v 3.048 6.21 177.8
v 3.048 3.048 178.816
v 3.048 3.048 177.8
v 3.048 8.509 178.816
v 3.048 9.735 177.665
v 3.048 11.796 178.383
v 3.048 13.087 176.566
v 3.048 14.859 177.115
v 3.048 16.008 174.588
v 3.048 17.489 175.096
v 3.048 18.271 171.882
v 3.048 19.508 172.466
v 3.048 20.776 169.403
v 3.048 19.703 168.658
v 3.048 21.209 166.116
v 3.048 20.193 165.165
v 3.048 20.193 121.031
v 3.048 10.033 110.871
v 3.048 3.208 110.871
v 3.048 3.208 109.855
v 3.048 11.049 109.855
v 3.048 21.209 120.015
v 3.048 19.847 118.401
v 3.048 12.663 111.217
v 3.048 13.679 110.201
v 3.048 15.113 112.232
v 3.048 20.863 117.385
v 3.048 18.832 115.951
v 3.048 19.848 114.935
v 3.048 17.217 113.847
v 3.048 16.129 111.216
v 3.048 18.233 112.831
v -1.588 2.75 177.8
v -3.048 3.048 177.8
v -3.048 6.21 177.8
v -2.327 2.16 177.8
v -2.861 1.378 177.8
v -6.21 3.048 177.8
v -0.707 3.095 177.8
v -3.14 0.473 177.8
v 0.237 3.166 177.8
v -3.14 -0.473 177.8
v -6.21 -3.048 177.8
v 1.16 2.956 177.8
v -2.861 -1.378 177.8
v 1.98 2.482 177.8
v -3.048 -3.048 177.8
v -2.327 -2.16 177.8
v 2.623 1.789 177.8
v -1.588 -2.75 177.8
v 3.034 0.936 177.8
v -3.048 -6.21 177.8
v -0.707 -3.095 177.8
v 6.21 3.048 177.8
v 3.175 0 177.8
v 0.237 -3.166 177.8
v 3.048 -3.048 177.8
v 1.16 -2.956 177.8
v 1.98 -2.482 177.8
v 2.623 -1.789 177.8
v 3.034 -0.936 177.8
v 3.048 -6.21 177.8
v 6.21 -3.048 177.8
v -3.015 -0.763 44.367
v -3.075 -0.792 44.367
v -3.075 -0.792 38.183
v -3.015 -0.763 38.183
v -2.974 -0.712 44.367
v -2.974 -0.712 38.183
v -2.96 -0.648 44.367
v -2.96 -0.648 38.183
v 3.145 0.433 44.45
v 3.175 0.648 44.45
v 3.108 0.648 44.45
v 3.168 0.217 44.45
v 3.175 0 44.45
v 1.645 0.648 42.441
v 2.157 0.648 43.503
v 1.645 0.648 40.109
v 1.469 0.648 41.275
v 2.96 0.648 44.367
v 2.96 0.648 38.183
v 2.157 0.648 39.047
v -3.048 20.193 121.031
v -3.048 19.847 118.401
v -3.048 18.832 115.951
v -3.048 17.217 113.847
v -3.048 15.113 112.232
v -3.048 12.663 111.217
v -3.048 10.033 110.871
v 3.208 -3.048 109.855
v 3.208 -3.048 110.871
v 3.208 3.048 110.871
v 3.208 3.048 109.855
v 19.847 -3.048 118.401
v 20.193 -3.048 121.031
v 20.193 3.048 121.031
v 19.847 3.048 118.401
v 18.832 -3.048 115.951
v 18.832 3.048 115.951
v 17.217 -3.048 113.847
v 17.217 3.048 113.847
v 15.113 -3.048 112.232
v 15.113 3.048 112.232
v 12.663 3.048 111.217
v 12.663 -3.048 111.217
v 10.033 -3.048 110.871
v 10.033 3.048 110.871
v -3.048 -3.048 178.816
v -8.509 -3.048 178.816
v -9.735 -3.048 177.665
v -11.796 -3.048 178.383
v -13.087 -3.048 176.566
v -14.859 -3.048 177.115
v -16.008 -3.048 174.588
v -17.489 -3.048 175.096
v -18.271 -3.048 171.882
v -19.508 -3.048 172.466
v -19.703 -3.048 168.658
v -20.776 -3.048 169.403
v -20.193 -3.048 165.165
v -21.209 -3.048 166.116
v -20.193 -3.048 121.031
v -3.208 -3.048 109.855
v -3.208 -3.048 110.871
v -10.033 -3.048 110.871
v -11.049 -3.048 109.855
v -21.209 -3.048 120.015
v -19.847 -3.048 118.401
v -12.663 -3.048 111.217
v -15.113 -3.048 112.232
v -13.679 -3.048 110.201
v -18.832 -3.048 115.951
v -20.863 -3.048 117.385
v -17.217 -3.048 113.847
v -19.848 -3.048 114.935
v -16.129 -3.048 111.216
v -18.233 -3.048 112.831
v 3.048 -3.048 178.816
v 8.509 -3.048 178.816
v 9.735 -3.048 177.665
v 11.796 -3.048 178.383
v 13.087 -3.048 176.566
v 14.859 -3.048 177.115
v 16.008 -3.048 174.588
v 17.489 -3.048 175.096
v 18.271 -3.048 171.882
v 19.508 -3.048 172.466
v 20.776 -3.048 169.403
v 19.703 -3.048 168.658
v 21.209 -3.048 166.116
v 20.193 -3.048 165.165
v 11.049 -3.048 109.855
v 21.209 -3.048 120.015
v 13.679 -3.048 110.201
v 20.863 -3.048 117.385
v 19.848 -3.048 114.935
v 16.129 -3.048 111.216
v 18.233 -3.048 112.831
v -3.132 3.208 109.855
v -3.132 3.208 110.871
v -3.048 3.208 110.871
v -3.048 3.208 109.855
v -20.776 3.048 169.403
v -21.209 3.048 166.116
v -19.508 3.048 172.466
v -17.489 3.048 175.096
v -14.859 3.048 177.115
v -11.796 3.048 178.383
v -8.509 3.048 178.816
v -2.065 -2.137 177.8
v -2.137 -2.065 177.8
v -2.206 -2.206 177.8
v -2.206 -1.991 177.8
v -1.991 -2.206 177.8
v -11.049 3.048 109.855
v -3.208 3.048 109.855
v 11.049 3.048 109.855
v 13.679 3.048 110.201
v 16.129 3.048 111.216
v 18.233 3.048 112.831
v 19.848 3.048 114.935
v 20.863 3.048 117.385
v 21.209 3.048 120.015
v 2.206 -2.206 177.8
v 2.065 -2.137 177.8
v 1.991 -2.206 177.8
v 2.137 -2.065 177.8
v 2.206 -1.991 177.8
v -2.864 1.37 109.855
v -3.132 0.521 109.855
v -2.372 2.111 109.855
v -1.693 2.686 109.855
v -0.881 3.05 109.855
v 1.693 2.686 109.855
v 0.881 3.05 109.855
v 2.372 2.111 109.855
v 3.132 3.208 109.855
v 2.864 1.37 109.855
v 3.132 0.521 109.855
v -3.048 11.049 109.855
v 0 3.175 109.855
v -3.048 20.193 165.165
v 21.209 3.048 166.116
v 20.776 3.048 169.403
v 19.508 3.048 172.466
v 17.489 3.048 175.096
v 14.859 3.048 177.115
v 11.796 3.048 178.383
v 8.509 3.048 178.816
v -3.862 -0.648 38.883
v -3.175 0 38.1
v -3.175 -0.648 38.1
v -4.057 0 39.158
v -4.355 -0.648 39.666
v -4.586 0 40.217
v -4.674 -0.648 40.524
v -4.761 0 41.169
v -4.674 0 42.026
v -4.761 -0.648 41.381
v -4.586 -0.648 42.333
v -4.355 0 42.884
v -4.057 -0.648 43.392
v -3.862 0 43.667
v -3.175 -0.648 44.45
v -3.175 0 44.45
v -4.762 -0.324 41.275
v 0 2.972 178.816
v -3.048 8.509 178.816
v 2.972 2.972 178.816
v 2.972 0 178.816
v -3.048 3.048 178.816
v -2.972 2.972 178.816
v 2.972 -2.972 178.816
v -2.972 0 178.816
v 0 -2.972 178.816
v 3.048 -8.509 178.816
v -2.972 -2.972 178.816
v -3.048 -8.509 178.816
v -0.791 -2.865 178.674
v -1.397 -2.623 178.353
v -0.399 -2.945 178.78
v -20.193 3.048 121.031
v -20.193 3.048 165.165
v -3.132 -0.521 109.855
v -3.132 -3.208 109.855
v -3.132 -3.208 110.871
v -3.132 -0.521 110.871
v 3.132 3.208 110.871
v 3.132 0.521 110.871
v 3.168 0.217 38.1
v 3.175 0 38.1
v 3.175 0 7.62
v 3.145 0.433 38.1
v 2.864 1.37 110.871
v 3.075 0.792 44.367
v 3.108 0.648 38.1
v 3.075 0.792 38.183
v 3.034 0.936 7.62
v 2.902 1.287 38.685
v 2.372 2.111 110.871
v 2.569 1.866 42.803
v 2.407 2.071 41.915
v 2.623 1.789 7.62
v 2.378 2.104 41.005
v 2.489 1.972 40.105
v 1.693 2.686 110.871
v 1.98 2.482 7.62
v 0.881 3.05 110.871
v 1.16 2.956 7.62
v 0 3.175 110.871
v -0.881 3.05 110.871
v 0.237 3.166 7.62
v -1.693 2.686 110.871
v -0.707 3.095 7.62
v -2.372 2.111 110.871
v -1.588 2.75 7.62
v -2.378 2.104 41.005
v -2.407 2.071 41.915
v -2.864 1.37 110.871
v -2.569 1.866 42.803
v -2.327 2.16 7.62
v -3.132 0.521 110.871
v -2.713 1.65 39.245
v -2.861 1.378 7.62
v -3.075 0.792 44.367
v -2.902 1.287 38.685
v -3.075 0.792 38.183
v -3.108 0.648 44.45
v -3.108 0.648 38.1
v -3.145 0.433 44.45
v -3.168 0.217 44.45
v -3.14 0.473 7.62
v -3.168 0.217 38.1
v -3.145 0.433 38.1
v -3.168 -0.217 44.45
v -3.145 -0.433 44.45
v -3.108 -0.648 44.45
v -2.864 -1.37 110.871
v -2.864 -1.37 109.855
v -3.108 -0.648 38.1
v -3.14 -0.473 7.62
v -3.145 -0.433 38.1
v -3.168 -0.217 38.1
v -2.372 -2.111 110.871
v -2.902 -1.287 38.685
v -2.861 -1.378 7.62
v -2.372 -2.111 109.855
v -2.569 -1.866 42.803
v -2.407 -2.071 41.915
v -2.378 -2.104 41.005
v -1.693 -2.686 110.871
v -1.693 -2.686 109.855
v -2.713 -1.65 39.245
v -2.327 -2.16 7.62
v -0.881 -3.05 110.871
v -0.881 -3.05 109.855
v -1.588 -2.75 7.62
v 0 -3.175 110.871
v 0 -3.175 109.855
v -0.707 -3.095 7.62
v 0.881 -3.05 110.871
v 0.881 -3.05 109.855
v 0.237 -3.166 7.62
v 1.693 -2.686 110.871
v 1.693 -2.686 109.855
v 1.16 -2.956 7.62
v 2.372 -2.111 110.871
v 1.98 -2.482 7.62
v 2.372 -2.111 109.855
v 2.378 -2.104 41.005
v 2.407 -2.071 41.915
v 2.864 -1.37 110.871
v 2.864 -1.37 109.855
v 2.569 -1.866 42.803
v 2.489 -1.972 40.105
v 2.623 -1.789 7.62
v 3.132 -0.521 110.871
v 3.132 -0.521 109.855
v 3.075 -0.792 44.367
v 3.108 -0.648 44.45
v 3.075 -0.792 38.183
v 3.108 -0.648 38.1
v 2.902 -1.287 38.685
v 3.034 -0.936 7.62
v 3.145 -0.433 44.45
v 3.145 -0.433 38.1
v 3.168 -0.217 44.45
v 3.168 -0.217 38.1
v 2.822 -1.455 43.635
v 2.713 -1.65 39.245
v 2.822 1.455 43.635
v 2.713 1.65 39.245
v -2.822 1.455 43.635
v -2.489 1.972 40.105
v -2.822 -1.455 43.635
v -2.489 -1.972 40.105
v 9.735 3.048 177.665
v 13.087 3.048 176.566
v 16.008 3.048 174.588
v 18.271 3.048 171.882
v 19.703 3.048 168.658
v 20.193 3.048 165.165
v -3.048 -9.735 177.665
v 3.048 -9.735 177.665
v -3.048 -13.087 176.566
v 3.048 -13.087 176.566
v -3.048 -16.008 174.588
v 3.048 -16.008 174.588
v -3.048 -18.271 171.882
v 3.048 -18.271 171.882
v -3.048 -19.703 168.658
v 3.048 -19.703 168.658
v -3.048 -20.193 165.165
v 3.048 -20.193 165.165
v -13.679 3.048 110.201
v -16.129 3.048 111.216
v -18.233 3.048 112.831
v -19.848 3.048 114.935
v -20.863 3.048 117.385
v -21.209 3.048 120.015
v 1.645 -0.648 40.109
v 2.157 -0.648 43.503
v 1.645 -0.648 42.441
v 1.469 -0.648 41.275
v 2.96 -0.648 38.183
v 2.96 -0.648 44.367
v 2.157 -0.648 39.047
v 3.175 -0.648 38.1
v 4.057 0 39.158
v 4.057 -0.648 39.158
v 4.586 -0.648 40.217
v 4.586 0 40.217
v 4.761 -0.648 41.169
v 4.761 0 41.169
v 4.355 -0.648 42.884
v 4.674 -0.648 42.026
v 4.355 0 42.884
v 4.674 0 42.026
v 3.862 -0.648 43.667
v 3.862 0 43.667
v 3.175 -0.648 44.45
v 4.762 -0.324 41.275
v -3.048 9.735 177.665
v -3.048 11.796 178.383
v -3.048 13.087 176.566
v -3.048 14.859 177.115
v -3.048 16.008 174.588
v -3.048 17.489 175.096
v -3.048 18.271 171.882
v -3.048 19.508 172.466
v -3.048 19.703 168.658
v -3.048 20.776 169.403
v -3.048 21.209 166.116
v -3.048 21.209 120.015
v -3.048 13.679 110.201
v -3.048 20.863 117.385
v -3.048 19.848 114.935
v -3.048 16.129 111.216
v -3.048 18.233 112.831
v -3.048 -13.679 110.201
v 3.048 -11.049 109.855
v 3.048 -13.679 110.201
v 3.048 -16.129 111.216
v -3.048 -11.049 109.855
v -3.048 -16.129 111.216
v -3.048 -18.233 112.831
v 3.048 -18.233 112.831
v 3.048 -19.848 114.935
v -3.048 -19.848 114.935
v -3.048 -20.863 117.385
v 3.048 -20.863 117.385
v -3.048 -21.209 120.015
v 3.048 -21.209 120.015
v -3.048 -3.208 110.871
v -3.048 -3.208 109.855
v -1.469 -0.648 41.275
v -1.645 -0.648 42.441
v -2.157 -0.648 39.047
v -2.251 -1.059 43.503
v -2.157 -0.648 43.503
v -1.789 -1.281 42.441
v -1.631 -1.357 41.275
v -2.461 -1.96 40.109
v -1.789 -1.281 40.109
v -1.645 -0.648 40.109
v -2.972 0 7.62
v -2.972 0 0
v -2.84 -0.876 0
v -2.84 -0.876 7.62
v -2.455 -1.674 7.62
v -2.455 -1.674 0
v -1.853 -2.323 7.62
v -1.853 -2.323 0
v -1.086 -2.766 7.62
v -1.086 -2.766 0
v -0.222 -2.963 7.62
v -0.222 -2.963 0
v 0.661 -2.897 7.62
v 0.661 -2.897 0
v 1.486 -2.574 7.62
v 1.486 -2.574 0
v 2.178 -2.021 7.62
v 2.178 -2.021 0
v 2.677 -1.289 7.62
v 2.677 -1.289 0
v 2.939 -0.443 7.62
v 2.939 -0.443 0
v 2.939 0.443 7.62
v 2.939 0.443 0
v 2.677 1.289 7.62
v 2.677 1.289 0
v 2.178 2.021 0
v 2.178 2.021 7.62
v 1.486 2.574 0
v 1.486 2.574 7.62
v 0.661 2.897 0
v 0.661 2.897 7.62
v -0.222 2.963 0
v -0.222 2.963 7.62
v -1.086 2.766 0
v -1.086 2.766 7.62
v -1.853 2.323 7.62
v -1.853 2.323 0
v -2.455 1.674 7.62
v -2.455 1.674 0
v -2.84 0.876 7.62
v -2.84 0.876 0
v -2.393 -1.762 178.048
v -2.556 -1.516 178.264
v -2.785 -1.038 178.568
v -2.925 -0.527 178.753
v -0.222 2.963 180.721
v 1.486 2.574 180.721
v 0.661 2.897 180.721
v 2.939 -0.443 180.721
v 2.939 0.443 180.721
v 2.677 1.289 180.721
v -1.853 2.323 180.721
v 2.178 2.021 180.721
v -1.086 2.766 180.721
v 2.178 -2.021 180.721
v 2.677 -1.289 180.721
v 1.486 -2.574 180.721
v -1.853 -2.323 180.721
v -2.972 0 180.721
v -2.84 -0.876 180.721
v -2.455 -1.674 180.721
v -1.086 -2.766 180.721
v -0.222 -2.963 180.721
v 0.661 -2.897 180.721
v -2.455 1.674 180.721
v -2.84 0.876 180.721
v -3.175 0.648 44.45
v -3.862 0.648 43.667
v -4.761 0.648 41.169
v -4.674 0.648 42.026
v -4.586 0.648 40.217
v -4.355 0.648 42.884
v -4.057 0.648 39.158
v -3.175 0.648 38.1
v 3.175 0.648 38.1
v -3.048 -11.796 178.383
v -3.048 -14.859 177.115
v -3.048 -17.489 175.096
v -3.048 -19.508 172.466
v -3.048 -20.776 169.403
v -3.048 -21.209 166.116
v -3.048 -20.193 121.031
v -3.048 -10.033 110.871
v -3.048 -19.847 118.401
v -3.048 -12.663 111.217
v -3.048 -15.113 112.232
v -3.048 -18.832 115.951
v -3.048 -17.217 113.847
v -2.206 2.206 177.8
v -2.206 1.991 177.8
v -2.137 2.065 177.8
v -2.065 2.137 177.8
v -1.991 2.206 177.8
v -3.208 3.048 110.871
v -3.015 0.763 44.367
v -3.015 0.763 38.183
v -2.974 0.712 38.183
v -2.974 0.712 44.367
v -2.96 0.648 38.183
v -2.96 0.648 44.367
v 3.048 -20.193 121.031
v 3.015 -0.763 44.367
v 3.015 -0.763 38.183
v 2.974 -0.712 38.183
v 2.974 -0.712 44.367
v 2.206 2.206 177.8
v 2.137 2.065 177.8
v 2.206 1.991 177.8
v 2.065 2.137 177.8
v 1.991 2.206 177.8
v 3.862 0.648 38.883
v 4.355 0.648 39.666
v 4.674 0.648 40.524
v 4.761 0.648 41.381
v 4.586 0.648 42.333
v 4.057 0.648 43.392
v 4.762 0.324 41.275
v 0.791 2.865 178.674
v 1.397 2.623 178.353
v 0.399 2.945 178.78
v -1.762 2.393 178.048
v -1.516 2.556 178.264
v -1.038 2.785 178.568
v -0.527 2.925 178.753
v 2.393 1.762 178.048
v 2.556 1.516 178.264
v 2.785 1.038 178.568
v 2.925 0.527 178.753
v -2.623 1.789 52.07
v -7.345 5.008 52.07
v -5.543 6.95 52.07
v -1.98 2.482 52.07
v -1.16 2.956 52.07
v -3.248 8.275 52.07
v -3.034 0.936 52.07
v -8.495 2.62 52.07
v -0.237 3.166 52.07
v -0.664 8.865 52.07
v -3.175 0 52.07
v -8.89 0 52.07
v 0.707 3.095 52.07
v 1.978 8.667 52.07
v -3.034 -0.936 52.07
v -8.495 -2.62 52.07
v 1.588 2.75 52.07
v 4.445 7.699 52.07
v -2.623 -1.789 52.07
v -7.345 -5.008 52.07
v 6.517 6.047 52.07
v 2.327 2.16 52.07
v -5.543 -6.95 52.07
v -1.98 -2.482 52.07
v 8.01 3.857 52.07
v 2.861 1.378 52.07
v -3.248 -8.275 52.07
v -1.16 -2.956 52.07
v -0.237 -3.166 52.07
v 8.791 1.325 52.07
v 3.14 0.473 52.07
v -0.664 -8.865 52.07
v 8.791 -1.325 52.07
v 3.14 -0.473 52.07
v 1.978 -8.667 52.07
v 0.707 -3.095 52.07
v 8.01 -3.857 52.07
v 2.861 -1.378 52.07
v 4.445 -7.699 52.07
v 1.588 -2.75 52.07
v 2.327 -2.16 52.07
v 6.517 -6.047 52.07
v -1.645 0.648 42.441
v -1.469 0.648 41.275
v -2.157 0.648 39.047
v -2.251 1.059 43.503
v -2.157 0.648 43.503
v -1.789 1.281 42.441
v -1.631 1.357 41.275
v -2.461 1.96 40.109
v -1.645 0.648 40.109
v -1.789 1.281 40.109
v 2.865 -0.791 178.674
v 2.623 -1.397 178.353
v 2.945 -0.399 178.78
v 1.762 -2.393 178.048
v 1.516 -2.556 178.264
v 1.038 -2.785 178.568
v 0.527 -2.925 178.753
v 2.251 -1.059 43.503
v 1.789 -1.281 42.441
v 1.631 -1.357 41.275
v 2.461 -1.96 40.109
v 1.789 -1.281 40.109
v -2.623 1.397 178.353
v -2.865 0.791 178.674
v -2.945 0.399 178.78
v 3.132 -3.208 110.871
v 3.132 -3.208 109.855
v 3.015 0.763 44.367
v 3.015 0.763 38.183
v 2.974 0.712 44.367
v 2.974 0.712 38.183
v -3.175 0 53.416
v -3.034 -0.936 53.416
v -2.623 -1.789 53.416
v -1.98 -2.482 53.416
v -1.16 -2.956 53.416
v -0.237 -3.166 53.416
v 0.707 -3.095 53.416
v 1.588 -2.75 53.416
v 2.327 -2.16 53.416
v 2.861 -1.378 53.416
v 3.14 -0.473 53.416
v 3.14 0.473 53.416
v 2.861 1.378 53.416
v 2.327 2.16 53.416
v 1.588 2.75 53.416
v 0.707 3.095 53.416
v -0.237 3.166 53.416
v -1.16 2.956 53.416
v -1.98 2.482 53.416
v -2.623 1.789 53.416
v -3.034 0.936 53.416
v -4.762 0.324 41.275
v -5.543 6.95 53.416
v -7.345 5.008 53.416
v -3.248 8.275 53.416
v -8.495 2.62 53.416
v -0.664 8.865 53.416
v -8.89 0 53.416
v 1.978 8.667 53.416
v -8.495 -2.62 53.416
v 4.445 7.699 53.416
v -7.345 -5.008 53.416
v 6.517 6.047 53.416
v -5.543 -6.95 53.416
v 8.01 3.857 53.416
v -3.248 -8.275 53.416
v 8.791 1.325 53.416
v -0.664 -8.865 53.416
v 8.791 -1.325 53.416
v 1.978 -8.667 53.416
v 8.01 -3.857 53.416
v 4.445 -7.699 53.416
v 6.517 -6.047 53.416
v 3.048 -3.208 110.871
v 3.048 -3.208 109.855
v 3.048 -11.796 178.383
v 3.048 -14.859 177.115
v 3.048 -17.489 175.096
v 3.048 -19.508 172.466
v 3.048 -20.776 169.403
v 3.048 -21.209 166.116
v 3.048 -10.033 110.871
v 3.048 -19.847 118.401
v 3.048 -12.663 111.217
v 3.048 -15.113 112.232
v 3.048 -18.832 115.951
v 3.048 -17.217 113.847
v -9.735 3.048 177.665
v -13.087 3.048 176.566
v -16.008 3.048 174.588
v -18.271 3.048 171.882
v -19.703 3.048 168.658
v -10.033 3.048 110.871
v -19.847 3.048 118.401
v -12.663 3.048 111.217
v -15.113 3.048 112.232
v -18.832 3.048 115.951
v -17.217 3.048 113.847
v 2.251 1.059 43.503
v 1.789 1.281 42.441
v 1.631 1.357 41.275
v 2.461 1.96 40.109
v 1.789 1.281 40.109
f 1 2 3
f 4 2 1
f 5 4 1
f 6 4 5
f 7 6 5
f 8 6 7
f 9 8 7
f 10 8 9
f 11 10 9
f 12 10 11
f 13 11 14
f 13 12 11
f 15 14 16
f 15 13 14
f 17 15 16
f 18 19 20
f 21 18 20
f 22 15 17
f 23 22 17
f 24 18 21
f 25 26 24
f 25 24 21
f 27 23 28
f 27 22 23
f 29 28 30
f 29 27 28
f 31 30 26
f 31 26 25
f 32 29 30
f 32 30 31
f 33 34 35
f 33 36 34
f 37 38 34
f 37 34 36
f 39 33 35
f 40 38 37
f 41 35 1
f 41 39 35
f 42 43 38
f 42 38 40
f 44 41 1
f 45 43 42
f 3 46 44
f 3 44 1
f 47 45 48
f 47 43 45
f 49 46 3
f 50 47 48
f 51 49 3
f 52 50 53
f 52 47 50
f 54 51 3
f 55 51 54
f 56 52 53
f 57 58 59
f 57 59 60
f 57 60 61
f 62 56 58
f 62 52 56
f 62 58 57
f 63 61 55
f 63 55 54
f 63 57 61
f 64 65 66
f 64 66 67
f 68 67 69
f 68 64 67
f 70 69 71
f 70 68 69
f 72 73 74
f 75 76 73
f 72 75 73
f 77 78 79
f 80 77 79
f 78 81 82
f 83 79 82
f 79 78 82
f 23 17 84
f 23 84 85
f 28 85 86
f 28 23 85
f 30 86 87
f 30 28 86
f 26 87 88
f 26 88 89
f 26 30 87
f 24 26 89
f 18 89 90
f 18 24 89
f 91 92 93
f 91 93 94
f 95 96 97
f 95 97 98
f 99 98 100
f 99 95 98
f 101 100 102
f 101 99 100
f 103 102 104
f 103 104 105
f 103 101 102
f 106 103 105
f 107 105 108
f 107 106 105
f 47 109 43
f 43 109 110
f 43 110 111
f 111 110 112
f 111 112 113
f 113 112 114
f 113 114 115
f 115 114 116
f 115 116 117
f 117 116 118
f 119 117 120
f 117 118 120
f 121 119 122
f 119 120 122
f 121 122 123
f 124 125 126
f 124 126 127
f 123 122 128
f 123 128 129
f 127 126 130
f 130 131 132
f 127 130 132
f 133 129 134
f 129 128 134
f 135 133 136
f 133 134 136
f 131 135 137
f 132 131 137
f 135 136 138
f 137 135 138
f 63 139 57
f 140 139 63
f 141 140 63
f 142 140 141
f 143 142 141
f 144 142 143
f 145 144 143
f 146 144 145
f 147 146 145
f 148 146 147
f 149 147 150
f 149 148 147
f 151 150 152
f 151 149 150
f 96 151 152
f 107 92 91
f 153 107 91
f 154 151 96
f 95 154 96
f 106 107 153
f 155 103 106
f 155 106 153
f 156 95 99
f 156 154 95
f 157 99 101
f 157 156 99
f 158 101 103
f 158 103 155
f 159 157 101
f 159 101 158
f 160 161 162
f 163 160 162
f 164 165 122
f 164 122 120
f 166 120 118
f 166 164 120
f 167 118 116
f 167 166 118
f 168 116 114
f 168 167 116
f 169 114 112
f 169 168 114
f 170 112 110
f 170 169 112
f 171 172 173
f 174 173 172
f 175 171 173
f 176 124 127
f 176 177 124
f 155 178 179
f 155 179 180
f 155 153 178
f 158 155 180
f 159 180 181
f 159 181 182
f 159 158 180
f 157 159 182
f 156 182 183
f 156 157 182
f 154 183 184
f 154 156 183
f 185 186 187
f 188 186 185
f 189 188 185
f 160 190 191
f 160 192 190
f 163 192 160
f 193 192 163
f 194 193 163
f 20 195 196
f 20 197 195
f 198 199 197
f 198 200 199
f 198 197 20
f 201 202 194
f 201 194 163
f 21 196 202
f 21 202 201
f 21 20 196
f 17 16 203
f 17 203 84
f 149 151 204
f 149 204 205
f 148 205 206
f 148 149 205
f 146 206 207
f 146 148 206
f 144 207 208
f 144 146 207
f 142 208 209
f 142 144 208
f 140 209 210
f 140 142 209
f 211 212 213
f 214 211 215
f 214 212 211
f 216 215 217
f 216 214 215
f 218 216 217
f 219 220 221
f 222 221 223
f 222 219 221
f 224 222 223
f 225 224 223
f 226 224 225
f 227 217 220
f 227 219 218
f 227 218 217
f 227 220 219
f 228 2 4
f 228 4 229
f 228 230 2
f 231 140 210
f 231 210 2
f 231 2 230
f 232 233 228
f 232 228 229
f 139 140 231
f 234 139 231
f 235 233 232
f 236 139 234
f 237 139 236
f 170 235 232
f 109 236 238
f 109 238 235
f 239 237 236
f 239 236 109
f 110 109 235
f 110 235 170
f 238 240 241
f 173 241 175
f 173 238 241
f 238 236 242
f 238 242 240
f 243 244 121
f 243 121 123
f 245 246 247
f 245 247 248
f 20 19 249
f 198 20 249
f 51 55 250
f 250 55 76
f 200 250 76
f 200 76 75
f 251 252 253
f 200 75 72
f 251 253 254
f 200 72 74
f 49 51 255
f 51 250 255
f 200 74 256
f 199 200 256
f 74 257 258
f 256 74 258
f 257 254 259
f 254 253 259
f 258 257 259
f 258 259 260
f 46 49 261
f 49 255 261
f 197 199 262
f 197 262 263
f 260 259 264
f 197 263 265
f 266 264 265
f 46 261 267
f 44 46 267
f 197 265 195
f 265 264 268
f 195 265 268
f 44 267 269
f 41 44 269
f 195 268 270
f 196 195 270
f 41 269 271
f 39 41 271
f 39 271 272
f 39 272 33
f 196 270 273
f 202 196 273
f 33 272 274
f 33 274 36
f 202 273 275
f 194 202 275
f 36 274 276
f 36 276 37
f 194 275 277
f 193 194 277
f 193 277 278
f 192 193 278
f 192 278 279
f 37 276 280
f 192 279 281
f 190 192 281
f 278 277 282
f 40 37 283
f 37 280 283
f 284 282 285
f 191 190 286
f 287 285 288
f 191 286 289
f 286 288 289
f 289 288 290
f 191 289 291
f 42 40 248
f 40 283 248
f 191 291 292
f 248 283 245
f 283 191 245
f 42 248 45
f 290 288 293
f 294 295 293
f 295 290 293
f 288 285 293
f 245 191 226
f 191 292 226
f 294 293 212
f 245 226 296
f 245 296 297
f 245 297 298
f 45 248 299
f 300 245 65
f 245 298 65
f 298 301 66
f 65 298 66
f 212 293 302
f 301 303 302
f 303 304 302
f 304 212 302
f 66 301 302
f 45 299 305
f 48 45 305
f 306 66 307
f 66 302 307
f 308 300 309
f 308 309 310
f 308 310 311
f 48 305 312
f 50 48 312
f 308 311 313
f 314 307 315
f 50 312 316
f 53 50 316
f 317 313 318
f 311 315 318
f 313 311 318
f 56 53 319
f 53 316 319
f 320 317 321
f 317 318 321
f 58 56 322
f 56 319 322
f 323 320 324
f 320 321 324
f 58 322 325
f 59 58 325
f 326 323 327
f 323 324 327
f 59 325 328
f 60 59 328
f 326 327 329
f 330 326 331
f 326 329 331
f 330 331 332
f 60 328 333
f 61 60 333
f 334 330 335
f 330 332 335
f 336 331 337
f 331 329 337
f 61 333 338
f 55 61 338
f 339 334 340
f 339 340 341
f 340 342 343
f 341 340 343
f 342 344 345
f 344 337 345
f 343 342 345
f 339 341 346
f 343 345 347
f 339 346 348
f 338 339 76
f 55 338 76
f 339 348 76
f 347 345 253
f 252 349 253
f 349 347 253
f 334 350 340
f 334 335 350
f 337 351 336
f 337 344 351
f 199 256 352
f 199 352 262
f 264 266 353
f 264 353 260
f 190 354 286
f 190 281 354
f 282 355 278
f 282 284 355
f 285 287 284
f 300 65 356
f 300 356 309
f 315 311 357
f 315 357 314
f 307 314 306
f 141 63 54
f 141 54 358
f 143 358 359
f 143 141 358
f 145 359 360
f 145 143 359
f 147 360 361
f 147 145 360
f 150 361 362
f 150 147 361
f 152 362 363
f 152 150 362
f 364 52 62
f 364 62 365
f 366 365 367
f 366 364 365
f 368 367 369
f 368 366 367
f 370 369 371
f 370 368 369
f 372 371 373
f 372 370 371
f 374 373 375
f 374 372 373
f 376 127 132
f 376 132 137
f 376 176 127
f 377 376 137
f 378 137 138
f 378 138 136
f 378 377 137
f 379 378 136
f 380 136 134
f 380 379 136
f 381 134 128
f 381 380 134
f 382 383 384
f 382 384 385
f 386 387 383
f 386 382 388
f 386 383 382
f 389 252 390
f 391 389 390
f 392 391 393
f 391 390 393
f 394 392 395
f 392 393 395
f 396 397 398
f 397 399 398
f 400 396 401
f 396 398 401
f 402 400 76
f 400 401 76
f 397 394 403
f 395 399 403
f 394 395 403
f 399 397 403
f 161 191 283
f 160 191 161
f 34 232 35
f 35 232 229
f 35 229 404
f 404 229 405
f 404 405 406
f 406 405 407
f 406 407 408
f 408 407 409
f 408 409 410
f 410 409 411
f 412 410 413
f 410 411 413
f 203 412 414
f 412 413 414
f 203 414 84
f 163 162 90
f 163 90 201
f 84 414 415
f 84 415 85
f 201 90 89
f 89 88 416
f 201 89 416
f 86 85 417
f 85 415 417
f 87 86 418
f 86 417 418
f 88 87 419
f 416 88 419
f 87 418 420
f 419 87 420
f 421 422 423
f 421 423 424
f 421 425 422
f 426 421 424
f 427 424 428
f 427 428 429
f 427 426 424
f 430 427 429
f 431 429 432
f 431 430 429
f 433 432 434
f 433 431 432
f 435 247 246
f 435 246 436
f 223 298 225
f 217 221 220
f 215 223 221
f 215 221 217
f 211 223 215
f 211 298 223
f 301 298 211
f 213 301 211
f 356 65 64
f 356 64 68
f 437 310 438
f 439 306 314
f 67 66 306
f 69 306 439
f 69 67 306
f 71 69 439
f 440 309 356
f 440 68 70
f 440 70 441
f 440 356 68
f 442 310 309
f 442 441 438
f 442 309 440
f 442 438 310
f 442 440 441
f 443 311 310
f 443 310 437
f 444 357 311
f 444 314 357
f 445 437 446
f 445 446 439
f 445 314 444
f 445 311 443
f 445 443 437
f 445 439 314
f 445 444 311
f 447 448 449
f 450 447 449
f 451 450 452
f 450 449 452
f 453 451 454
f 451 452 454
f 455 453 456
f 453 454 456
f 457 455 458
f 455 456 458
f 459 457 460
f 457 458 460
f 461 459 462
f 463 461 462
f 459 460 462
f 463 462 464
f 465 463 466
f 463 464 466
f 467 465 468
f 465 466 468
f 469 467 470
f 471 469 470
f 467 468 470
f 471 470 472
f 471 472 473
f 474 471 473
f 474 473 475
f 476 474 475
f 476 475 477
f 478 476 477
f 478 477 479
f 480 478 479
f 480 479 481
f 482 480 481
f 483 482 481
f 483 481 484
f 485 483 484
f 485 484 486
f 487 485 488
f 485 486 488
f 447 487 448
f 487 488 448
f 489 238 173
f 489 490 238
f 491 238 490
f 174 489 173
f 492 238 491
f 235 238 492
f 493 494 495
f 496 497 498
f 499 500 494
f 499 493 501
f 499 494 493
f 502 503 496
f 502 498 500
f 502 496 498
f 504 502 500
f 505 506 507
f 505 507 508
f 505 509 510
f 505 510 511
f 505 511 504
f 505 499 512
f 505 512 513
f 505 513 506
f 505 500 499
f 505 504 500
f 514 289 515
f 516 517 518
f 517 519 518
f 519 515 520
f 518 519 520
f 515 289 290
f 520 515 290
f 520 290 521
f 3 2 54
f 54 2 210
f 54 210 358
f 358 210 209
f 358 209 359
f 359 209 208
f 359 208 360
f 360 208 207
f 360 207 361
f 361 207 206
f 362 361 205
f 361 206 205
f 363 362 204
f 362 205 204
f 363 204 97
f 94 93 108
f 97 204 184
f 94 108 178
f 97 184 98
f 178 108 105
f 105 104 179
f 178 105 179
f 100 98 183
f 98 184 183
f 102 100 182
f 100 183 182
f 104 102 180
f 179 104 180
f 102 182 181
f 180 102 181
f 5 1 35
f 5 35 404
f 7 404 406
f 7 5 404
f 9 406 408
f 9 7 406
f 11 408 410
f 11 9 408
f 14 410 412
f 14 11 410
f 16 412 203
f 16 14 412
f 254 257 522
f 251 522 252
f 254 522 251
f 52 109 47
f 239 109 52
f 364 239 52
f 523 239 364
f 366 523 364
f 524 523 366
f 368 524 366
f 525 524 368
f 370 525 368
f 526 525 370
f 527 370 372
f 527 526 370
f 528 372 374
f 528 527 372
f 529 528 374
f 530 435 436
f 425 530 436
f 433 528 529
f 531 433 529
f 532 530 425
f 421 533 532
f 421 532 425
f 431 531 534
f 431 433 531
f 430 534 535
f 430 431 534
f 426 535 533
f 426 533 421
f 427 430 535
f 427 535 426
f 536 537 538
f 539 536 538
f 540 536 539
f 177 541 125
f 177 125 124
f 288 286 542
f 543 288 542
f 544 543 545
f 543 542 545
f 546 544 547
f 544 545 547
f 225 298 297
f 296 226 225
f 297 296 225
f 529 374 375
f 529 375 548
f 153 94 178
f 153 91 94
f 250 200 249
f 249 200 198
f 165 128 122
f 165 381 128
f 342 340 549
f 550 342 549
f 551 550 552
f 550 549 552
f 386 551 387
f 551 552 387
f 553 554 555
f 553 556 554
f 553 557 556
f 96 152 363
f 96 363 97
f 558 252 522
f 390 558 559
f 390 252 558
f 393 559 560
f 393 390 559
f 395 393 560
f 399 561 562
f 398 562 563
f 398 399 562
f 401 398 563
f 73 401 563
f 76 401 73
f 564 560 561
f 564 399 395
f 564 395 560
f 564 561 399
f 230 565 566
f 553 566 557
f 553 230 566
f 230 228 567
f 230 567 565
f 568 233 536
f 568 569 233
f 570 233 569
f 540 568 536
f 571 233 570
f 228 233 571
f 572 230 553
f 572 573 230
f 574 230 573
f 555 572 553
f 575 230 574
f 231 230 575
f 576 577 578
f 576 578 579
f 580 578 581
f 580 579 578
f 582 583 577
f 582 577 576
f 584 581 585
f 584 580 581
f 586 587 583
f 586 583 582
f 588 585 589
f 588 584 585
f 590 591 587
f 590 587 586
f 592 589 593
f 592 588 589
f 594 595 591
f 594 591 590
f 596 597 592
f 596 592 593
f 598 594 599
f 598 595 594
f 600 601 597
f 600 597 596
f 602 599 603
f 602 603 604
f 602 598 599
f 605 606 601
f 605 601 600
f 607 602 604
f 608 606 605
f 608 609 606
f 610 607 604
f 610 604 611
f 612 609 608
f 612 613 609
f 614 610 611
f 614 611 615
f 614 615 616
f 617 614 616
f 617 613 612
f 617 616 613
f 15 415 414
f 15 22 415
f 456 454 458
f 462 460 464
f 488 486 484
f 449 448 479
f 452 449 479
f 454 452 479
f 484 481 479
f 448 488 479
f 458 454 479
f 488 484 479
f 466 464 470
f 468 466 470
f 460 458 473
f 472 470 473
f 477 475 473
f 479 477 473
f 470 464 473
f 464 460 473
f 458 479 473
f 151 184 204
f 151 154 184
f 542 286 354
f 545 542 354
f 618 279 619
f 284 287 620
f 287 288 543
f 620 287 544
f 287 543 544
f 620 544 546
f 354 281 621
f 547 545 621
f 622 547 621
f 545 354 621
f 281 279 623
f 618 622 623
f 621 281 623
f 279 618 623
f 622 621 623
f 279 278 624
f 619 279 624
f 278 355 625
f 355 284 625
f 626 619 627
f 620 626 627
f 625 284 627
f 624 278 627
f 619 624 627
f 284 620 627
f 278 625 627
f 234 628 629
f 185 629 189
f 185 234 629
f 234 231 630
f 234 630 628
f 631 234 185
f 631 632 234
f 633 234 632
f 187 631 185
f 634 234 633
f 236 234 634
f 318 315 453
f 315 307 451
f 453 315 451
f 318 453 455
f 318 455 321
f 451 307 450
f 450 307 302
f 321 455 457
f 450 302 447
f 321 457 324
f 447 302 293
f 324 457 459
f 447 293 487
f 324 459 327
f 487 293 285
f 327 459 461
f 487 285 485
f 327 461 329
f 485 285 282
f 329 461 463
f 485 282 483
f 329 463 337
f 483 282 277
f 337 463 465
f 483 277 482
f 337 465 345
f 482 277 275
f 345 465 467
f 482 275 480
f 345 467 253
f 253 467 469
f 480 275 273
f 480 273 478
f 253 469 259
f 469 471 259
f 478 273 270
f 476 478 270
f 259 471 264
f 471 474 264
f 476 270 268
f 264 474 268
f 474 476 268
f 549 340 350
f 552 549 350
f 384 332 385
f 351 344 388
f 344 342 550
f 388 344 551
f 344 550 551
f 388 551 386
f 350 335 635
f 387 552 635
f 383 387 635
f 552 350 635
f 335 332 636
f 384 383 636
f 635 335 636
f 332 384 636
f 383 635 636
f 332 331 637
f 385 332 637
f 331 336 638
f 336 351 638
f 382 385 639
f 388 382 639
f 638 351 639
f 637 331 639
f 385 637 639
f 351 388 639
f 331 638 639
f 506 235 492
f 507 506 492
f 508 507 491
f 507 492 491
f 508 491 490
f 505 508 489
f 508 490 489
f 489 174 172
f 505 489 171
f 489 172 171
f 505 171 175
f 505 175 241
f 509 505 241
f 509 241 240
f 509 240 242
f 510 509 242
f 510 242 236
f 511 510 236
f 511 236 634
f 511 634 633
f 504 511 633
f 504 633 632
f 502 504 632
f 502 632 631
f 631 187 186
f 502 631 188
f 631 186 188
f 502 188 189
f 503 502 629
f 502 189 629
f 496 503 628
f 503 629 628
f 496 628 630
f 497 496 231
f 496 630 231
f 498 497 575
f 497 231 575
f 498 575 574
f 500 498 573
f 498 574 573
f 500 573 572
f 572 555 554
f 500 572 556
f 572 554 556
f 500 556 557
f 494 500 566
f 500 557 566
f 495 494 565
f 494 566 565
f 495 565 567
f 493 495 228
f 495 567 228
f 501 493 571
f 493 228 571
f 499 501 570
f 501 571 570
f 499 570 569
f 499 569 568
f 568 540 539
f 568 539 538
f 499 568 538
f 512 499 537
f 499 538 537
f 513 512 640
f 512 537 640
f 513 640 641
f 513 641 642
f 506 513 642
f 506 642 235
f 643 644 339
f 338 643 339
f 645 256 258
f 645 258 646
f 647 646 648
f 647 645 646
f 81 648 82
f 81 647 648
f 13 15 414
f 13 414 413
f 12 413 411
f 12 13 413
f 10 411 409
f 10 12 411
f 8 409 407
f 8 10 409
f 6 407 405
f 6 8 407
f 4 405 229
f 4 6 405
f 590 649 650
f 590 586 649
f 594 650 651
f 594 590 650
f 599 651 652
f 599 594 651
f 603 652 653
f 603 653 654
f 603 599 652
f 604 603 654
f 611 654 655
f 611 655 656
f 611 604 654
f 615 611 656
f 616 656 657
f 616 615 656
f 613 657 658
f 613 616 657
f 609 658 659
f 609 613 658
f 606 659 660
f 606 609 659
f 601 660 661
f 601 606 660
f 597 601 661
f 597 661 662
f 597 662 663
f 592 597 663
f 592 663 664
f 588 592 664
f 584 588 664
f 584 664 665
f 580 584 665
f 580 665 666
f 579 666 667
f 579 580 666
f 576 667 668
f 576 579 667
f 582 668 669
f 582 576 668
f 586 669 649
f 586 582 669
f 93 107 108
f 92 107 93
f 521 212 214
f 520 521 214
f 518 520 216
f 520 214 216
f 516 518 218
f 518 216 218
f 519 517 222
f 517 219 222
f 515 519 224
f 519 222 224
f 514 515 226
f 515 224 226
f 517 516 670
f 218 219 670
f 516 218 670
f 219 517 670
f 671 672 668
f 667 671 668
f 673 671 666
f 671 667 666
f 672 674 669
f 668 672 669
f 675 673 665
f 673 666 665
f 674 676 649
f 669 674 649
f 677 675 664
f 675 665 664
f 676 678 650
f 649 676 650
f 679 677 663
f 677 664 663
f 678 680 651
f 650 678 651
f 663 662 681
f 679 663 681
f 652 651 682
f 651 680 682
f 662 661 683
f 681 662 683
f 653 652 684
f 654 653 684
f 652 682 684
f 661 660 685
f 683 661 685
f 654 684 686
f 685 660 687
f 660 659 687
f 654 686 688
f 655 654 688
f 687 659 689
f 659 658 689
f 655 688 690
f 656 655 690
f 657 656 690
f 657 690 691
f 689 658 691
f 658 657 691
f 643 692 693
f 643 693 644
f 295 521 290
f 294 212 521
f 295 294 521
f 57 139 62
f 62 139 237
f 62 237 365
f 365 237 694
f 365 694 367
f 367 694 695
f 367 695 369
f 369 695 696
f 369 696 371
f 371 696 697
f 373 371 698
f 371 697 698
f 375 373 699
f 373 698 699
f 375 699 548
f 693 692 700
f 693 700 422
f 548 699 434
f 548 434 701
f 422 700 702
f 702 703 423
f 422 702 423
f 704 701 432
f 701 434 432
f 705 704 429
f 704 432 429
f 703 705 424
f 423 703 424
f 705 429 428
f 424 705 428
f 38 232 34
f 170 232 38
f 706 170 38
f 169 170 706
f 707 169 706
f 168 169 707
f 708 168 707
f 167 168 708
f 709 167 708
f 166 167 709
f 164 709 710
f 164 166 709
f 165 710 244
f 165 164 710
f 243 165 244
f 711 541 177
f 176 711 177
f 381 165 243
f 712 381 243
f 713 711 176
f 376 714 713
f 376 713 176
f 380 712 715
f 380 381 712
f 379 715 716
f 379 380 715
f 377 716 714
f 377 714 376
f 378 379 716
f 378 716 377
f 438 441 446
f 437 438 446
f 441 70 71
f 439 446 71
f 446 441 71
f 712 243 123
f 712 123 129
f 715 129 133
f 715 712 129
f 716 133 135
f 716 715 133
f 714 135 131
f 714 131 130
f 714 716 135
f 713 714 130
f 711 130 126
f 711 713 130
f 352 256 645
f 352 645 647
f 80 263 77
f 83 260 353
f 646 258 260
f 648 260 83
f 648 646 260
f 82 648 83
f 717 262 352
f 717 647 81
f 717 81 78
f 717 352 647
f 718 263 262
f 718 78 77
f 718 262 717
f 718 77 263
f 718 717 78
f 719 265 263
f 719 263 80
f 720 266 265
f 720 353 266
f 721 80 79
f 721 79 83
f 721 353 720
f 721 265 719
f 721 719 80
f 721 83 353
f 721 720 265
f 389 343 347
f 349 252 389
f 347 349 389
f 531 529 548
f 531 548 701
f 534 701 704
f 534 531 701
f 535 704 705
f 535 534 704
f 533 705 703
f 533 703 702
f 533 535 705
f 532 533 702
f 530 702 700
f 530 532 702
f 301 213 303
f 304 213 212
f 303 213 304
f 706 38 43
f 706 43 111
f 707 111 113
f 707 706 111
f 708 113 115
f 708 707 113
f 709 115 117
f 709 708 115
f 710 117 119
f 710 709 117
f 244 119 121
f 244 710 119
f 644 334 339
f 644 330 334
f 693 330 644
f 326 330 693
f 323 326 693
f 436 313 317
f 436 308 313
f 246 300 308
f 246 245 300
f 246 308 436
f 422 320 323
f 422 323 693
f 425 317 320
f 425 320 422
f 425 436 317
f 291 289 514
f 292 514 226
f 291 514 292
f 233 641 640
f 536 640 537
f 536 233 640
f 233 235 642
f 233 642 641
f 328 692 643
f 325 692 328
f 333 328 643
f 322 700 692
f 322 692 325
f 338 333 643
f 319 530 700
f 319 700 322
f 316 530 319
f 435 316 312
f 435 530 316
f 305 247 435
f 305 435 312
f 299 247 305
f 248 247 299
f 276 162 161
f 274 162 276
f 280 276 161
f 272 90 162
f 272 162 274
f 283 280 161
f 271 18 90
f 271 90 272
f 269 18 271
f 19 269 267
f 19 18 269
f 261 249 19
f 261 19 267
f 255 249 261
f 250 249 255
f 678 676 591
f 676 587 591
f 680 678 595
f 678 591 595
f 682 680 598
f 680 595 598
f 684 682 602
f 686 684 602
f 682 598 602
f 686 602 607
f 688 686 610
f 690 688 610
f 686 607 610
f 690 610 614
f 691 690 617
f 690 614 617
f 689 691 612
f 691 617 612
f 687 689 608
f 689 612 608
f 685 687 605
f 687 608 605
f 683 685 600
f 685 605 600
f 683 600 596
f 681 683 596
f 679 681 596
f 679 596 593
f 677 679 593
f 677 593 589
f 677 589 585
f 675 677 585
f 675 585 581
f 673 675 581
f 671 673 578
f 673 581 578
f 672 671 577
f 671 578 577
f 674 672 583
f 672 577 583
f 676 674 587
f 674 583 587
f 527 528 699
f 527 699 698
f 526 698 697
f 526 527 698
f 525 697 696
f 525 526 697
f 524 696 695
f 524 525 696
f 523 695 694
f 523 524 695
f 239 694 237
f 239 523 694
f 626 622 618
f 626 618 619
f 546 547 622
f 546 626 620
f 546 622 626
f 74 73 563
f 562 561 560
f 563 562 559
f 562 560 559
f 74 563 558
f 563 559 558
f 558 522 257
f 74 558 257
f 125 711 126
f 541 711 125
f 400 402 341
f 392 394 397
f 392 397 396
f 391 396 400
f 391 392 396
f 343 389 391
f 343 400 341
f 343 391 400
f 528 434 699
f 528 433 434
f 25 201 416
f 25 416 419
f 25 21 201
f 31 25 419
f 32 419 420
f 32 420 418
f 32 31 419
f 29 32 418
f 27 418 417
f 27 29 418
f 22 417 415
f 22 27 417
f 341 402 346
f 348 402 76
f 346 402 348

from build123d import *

# Parameters (mm, degrees)
SKETCH1_R            = 3.175
BOSS_EXTRUDE1_DEPTH  = 177.8
SKETCH2_R            = 2.9718
BOSS_EXTRUDE2_DEPTH  = 7.874
BOSS_EXTRUDE3_DEPTH  = 0.6477
SKETCH2_7_OUTSIDE_W  = 47.16
SKETCH2_7_OUTSIDE_H  = 43.984
SKETCH2_7_OUTSIDE_R  = 2.9718
CUT_EXTRUDE2_DEPTH   = 7.62
SKETCH9_W            = 1.3462
SKETCH9_H            = 5.715
SKETCH31_R           = 2.9718
BOSS_EXTRUDE6_DEPTH  = 2.921
SKETCH32_W           = 6.263880776
SKETCH32_H           = 6.416852852
BOSS_EXTRUDE9_DEPTH  = 1.016
BOSS_EXTRUDE10_DEPTH = 3.048
CIRPATTERN1_COUNT    = 4
CUT_REVOLVE3_ANGLE   = 180
MIRROR3_COPY_1_ANGLE = 180


with BuildPart() as part:
    # Sketch1 → Boss-Extrude1 (new body)
    with BuildSketch(Plane.XY):
        Circle(SKETCH1_R)
    extrude(amount=BOSS_EXTRUDE1_DEPTH)

    # Sketch2 → Boss-Extrude2 (add)
    with BuildSketch(Plane.XY):
        Circle(SKETCH2_R)
    extrude(amount=BOSS_EXTRUDE2_DEPTH)

    # Sketch3 → Boss-Extrude3 (add, symmetric)
    with BuildSketch(Plane(origin=(0, 0, 0), x_dir=(1, 0, 0), z_dir=(0, 1, 0))):
        with BuildLine():
            Line((-3.175, -38.1), (3.175, -38.1))
            add(Edge.make_bspline(
                [(3.175, -38.1), (6.35, -41.275), (3.175, -44.45)],
                knots=[0, 0, 0, 1, 1, 1], degree=2))
            Line((3.175, -44.45), (-3.175, -44.45))
            add(Edge.make_bspline(
                [(-3.175, -38.1), (-6.35, -41.275), (-3.175, -44.45)],
                knots=[0, 0, 0, 1, 1, 1], degree=2))
        make_face()
    extrude(amount=BOSS_EXTRUDE3_DEPTH, both=True)

    # Sketch2<7> outside → Cut-Extrude2 (cut)
    with BuildSketch(Plane.XY):
        Rectangle(SKETCH2_7_OUTSIDE_W, SKETCH2_7_OUTSIDE_H)
        with Locations(Location((0, 0, 0), (0, 0, 180))):
            Circle(SKETCH2_7_OUTSIDE_R, mode=Mode.SUBTRACT)
    extrude(amount=CUT_EXTRUDE2_DEPTH, mode=Mode.SUBTRACT)

    # Sketch31 → Boss-Extrude6 (add)
    with BuildSketch(Plane.XY.offset(177.8)):
        with Locations(Location((0, 0, 0), (0, 0, 180))):
            Circle(SKETCH31_R)
    extrude(amount=BOSS_EXTRUDE6_DEPTH)

    # Sketch32 → Boss-Extrude9 (add)
    with BuildSketch(Plane.XY.offset(109.855)):
        Rectangle(SKETCH32_W, SKETCH32_H)
    extrude(amount=BOSS_EXTRUDE9_DEPTH)

    # Sketch30 → Boss-Extrude10 (add, symmetric)
    with BuildSketch(Plane(origin=(0, 0, 0), x_dir=(0, 0, -1), z_dir=(1, 0, 0))):
        with BuildLine():
            Line((-120.015, 21.209), (-166.116, 21.209))
            ThreePointArc((-166.116, 21.209), (-175.096256121, 17.489256121), (-178.816, 8.509))
            Line((-178.816, 8.509), (-178.816, 2.9718))
            Line((-178.816, 2.9718), (-177.8, 2.205888301))
            Line((-177.8, 2.205888301), (-177.8, 6.210195024))
            ThreePointArc((-177.8, 6.210195024), (-174.587840698, 16.007645524), (-165.164953051, 20.193))
            Line((-165.164953051, 20.193), (-121.031, 20.193))
            ThreePointArc((-121.031, 20.193), (-113.846795103, 17.217204897), (-110.871, 10.033))
            Line((-110.871, 10.033), (-110.871, 3.208426426))
            Line((-110.871, 3.208426426), (-109.855, 3.208426426))
            Line((-109.855, 3.208426426), (-109.855, 11.049))
            ThreePointArc((-109.855, 11.049), (-112.830795103, 18.233204897), (-120.015, 21.209))
        make_face()
    boss_extrude10 = extrude(amount=BOSS_EXTRUDE10_DEPTH, both=True)

    # CirPattern1: Boss-Extrude10 ×4 about axis
    cirpattern1_axis = Axis((0, 0, 0), (0, 0, 1))
    for i in range(1, CIRPATTERN1_COUNT):
        add(boss_extrude10.rotate(cirpattern1_axis, i * 360 / CIRPATTERN1_COUNT))

    # Sketch36 → Cut-Revolve3 (revolve, cut)
    with BuildSketch(Plane(origin=(0, -0.6477, 0), x_dir=(-1, 0, 0), z_dir=(0, -1, 0))):
        with BuildLine():
            Line((-3.256634196, -38.182711551), (-3.256634196, -44.367288449))
            ThreePointArc((-3.256634196, -44.367288449), (-4.747079201, -41.275), (-3.256634196, -38.182711551))
        make_face()
    cut_revolve3 = revolve(axis=Axis((3.10823257, -0.6477, 38.1), (0, 0, -1)), revolution_arc=CUT_REVOLVE3_ANGLE, mode=Mode.SUBTRACT)

    # Mirror1: Cut-Revolve3 across plane
    add(cut_revolve3.mirror(Plane.ZX), mode=Mode.SUBTRACT)

    # Mirror3: Cut-Revolve3 across plane
    add(cut_revolve3.mirror(Plane(origin=(0, 0, 0), x_dir=(0, 0, 1), z_dir=(1, 0, 0))), mode=Mode.SUBTRACT)

    # Mirror3 copy 1 sketch → Mirror3 copy 1 (revolve, cut)
    with BuildSketch(Plane(origin=(0, 0.6477, 0), x_dir=(1, 0, 0), z_dir=(0, 1, 0))):
        with BuildLine():
            Line((-3.256634196, -38.182711551), (-3.256634196, -44.367288449))
            ThreePointArc((-3.256634196, -44.367288449), (-4.747079201, -41.275), (-3.256634196, -38.182711551))
        make_face()
    revolve(axis=Axis((-3.10823257, 0.6477, 38.1), (0, 0, -1)), revolution_arc=MIRROR3_COPY_1_ANGLE, mode=Mode.SUBTRACT)


with BuildPart() as body_2:
    # Sketch9 → Revolve2 (revolve)
    with BuildSketch(Plane(origin=(0, 0, 0), x_dir=(0, 0, -1), z_dir=(1, 0, 0)), mode=Mode.PRIVATE) as revolve2_sk:
        with Locations((-52.7431, 6.0325)):
            Rectangle(SKETCH9_W, SKETCH9_H)
    revolve(revolve2_sk.sketch.rotate(Axis((0, 0, -88.99), (0, 0, 1)), 90), axis=Axis((0, 0, -88.99), (0, 0, 1)))


solid = Compound([part.part, body_2.part])
